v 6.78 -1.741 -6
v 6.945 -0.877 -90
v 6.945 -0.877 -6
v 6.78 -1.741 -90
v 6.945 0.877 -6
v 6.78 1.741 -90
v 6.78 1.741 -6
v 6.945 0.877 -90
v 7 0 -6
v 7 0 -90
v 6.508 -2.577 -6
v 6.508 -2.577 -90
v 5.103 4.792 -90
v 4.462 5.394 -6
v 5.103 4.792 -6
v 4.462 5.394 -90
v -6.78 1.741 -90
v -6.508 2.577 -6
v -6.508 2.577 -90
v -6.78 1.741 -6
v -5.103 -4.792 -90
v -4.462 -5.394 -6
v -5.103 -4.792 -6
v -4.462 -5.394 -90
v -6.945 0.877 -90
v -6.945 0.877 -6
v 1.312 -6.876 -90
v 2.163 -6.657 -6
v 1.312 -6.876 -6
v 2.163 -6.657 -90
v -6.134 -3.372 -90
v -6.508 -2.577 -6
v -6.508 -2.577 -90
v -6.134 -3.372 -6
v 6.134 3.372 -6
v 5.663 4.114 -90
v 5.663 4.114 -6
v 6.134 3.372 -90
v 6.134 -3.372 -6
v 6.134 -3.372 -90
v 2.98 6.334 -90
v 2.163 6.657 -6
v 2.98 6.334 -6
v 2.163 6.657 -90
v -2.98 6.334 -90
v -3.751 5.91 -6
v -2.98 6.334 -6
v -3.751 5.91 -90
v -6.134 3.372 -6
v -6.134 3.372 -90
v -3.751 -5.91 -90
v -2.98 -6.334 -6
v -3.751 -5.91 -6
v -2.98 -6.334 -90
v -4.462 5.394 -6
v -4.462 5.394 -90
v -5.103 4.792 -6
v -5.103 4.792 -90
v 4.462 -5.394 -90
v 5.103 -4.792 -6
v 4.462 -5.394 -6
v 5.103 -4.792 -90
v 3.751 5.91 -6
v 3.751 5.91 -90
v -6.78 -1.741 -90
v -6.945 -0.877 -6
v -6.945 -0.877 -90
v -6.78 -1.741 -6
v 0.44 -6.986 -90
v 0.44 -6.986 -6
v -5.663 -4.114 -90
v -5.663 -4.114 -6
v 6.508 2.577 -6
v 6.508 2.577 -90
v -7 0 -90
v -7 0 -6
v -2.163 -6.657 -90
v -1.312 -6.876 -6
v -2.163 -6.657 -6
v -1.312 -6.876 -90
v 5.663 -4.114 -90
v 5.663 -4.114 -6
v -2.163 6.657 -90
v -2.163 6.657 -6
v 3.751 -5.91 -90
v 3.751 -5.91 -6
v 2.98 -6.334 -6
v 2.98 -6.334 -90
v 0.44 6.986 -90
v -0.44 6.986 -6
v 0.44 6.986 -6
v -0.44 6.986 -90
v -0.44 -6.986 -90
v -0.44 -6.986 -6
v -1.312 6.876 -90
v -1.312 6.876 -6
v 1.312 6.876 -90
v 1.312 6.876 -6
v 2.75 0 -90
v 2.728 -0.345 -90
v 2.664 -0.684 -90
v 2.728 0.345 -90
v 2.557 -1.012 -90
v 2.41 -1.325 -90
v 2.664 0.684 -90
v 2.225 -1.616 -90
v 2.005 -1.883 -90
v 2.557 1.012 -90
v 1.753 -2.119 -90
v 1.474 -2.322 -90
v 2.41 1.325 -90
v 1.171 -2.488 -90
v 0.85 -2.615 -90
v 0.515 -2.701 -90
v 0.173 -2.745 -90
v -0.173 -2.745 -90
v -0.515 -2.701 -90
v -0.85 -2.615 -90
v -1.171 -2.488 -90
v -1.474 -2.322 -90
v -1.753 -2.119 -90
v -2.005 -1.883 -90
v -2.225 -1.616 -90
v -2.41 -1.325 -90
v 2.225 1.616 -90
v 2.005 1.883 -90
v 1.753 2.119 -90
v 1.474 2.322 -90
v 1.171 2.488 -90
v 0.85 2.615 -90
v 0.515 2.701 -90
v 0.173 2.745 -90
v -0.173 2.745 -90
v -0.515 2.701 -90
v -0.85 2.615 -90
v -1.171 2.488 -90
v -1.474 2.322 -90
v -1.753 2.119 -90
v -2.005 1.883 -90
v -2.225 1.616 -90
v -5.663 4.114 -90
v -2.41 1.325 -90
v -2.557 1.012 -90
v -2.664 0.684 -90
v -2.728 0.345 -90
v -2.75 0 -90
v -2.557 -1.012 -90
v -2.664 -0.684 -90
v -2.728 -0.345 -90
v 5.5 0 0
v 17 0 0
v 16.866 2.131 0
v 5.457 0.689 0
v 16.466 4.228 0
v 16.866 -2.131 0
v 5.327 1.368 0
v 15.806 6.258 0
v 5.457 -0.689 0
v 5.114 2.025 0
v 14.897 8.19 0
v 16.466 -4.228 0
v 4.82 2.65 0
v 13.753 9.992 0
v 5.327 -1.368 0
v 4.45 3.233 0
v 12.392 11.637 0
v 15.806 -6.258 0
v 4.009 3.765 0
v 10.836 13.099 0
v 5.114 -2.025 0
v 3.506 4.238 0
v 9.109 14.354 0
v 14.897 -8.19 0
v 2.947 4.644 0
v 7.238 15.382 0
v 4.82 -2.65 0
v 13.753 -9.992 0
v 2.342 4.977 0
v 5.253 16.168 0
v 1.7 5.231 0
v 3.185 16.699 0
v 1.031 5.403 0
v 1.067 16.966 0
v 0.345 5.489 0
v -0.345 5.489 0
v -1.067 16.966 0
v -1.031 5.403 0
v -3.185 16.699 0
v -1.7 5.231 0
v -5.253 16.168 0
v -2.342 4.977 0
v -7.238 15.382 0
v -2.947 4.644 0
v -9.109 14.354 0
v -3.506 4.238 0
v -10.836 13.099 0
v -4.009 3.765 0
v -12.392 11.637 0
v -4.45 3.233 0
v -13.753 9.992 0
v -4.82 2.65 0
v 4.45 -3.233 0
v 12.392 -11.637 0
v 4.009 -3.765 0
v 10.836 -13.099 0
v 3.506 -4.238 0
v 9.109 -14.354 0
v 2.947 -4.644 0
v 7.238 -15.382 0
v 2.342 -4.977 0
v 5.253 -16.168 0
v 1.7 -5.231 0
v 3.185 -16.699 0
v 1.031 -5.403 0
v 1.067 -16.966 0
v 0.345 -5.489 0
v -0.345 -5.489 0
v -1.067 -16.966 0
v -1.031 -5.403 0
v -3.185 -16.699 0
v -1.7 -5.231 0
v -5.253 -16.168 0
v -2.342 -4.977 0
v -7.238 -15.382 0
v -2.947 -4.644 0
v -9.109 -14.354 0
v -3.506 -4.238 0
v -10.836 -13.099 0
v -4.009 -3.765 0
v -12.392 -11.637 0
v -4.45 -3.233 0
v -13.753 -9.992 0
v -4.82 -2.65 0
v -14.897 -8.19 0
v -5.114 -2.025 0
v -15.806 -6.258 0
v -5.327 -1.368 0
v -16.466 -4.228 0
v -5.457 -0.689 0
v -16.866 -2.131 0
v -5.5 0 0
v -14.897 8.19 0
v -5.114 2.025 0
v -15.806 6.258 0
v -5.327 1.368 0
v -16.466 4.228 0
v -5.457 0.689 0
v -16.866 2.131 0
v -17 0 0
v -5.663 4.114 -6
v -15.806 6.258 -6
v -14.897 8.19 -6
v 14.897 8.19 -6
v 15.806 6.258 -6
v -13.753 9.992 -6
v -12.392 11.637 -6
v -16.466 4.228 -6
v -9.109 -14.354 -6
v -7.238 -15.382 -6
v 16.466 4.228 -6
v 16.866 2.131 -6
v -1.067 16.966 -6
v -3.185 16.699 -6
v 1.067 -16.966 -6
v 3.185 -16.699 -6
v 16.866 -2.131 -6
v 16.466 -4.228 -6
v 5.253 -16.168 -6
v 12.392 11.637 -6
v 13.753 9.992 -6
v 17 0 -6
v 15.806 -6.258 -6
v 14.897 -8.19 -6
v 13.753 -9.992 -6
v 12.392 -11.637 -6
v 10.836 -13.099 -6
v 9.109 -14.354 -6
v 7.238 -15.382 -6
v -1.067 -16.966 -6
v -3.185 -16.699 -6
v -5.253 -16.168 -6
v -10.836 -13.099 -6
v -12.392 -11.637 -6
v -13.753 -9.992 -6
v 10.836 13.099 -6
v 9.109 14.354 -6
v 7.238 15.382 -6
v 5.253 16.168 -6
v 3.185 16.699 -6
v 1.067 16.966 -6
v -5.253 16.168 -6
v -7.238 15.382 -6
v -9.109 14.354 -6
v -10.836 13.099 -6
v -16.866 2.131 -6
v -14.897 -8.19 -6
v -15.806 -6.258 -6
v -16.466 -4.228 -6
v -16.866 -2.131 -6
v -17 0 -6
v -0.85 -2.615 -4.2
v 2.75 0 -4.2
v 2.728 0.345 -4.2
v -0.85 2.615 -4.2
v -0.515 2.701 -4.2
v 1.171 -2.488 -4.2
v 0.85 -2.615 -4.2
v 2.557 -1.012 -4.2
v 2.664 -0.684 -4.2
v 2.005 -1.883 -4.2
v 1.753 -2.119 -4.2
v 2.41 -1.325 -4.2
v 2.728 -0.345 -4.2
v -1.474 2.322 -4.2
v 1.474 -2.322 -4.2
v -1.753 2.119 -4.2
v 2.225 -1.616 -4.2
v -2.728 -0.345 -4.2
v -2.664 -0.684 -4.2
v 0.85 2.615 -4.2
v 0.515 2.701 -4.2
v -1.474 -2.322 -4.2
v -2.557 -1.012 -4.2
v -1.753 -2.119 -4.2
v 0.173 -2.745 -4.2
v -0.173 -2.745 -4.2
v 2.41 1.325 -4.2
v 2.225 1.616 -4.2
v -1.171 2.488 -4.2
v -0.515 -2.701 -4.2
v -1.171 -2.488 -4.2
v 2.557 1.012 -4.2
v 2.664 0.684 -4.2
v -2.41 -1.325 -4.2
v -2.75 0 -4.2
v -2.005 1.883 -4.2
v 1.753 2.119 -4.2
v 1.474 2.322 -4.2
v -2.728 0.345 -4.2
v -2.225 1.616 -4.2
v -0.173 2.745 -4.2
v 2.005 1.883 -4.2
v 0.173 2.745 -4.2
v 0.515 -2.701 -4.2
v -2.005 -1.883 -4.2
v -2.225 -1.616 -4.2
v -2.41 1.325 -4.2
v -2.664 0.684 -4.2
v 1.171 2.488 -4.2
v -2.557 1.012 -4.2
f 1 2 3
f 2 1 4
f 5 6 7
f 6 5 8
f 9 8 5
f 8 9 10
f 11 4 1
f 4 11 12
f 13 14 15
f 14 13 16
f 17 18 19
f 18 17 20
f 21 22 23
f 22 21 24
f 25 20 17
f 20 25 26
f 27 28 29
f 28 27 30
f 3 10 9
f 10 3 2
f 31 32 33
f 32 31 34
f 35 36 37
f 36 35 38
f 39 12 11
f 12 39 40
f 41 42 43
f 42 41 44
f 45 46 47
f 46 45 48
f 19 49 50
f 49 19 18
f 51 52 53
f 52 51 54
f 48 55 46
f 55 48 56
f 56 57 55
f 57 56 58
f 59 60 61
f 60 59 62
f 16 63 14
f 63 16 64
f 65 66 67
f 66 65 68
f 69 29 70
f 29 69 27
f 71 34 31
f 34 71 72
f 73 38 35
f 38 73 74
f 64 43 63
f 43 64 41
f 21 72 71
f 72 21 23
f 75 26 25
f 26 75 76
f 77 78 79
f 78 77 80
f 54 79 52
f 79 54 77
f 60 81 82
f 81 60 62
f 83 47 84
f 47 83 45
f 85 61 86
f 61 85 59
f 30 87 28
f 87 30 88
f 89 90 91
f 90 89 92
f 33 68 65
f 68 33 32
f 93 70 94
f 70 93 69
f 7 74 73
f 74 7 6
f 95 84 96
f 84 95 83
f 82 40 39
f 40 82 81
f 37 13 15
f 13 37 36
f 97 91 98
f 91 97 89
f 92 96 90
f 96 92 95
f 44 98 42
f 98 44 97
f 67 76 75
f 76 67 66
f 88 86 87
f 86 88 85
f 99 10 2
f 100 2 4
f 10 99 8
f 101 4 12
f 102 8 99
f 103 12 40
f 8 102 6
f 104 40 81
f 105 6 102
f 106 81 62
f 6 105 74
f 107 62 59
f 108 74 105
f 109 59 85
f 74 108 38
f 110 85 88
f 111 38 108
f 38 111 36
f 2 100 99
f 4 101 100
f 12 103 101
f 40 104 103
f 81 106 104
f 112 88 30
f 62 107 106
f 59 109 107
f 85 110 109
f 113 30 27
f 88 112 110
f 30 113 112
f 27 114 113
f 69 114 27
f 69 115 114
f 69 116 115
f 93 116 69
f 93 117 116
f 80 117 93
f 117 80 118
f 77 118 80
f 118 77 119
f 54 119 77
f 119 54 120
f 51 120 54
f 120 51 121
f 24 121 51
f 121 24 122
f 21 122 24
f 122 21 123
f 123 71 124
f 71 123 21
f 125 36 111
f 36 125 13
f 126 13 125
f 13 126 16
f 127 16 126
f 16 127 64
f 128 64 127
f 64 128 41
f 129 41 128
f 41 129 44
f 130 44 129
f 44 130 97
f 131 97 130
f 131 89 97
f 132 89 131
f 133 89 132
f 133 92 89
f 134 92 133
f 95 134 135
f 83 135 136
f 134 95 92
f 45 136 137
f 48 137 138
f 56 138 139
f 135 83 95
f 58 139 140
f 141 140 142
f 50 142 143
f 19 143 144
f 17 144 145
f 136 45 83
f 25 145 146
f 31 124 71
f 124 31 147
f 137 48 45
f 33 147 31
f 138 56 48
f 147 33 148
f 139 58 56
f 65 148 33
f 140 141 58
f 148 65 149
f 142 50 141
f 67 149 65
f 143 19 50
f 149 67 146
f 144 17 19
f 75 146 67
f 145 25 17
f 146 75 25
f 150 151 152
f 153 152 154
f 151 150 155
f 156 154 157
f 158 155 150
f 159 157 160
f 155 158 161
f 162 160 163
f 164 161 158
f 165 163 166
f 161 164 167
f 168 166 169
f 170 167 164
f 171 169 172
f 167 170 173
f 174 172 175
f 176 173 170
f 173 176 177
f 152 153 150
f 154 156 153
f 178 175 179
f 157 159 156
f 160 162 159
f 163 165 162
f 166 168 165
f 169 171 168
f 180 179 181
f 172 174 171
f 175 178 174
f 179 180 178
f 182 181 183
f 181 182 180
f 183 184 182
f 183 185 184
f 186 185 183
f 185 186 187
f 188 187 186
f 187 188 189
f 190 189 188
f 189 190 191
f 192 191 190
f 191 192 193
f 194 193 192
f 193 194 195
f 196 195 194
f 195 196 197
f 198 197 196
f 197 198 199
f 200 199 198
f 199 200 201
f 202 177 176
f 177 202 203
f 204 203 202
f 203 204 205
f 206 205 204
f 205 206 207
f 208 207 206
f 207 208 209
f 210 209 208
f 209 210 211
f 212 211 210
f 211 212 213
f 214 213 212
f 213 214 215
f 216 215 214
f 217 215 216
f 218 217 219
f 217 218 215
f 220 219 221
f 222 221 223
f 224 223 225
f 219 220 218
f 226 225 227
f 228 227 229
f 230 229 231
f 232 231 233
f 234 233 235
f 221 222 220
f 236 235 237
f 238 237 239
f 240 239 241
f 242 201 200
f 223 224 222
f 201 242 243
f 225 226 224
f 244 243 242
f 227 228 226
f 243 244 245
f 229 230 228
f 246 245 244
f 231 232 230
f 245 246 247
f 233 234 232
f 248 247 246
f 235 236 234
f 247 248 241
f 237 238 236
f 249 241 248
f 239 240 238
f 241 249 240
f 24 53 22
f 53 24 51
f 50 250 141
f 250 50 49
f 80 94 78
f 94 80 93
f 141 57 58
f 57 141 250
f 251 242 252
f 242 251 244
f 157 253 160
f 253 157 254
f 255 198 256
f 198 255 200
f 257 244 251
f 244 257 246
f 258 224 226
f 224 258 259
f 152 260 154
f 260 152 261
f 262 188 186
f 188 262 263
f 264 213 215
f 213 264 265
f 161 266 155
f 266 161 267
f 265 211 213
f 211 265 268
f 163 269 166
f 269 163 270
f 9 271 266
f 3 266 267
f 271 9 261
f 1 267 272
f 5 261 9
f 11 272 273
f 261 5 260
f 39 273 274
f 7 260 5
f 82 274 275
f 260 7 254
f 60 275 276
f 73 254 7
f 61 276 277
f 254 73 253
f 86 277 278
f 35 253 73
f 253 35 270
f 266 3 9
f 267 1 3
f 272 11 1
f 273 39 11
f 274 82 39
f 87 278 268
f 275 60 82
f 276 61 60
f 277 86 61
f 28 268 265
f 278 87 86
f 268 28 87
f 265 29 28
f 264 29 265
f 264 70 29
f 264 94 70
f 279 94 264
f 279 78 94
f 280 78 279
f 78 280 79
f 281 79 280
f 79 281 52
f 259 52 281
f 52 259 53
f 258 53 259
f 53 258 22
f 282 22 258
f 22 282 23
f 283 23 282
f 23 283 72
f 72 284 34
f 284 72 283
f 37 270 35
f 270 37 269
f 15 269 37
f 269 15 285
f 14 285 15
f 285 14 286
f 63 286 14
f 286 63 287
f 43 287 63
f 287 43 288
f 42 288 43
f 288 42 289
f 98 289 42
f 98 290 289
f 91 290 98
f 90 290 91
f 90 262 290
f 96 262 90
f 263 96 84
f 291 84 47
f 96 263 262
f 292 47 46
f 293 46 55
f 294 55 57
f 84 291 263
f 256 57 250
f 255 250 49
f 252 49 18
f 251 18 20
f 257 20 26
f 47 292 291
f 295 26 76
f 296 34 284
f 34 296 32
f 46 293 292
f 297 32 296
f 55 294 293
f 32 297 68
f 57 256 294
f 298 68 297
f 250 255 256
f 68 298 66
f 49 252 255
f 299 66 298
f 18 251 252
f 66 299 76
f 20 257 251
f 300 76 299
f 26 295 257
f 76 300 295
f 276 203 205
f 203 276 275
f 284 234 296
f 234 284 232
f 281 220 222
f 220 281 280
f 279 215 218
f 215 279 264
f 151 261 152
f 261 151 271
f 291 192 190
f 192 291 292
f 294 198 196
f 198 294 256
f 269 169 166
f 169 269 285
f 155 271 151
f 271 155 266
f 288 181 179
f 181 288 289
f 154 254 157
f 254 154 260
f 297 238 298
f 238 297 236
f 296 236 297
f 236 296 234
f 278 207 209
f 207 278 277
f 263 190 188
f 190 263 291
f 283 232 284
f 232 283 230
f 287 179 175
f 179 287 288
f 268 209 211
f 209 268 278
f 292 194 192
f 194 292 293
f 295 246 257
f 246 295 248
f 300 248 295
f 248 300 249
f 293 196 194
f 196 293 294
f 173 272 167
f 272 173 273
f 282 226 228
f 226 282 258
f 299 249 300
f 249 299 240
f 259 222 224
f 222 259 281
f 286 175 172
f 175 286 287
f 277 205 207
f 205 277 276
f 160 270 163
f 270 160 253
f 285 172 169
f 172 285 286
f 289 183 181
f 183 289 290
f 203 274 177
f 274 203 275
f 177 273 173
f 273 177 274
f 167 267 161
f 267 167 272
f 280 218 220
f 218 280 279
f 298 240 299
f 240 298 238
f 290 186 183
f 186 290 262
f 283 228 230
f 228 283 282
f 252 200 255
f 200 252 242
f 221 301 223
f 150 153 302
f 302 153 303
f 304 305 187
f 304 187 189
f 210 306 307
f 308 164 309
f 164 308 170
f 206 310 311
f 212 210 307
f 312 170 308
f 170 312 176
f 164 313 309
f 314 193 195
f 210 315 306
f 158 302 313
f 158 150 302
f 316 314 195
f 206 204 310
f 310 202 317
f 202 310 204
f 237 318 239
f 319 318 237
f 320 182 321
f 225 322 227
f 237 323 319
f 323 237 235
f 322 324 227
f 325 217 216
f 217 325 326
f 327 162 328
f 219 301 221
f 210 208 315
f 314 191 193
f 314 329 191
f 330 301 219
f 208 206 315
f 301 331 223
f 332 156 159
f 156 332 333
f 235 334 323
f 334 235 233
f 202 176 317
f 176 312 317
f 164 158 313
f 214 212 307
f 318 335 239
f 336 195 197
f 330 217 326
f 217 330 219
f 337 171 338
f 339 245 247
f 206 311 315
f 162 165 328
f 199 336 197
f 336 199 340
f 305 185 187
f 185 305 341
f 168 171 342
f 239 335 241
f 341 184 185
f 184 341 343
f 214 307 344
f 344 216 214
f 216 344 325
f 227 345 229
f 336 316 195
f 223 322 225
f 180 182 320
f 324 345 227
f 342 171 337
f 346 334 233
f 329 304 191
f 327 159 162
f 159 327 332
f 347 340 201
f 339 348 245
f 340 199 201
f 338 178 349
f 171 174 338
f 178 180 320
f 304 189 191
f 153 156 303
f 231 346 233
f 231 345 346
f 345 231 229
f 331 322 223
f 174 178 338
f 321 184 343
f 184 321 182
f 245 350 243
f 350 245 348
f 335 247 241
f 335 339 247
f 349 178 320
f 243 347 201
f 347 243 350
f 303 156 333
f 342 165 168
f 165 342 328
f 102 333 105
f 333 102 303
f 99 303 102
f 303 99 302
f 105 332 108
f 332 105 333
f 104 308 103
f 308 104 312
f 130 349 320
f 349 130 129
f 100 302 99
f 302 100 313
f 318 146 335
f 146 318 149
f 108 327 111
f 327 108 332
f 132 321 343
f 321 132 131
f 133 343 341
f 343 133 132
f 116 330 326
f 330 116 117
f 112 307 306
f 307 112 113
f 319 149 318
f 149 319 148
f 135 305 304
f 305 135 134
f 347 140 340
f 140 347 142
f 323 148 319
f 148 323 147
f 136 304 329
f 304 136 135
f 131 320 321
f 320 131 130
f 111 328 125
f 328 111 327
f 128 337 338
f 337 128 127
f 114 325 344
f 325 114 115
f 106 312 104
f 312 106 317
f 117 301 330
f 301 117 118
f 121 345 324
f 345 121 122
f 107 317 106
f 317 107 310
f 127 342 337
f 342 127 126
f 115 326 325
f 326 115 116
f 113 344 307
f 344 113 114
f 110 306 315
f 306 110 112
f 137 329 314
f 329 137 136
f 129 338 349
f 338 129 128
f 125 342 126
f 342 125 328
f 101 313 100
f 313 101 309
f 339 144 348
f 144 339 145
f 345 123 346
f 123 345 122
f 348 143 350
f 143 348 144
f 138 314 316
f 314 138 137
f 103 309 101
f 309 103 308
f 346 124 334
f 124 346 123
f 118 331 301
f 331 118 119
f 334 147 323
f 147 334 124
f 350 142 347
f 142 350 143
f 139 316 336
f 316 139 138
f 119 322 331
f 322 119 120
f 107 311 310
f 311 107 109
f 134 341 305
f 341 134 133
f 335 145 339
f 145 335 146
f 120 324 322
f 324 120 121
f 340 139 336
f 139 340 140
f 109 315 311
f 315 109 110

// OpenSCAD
$fn = 50;


difference() {
	union() {
		translate(v = [0, 0, -90.0000000000]) {
			cylinder(h = 90, r = 7.0000000000);
		}
		translate(v = [0, 0, -6.0000000000]) {
			cylinder(h = 6, r = 17.0000000000);
		}
	}
	union() {
		translate(v = [0, 0, 0]) {
			rotate(a = [0, 0, 0]) {
				difference() {
					union() {
						#translate(v = [0, 0, -90.0000000000]) {
							cylinder(h = 90, r = 2.2500000000);
						}
						#translate(v = [0, 0, -4.2000000000]) {
							cylinder(h = 4.2000000000, r = 7.0000000000, r1 = 2.7500000000, r2 = 5.5000000000);
						}
						#translate(v = [0, 0, -90.0000000000]) {
							cylinder(h = 90, r = 2.7500000000);
						}
						#translate(v = [0, 0, -90.0000000000]) {
							cylinder(h = 90, r = 2.2500000000);
						}
					}
					union();
				}
			}
		}
	}
}
